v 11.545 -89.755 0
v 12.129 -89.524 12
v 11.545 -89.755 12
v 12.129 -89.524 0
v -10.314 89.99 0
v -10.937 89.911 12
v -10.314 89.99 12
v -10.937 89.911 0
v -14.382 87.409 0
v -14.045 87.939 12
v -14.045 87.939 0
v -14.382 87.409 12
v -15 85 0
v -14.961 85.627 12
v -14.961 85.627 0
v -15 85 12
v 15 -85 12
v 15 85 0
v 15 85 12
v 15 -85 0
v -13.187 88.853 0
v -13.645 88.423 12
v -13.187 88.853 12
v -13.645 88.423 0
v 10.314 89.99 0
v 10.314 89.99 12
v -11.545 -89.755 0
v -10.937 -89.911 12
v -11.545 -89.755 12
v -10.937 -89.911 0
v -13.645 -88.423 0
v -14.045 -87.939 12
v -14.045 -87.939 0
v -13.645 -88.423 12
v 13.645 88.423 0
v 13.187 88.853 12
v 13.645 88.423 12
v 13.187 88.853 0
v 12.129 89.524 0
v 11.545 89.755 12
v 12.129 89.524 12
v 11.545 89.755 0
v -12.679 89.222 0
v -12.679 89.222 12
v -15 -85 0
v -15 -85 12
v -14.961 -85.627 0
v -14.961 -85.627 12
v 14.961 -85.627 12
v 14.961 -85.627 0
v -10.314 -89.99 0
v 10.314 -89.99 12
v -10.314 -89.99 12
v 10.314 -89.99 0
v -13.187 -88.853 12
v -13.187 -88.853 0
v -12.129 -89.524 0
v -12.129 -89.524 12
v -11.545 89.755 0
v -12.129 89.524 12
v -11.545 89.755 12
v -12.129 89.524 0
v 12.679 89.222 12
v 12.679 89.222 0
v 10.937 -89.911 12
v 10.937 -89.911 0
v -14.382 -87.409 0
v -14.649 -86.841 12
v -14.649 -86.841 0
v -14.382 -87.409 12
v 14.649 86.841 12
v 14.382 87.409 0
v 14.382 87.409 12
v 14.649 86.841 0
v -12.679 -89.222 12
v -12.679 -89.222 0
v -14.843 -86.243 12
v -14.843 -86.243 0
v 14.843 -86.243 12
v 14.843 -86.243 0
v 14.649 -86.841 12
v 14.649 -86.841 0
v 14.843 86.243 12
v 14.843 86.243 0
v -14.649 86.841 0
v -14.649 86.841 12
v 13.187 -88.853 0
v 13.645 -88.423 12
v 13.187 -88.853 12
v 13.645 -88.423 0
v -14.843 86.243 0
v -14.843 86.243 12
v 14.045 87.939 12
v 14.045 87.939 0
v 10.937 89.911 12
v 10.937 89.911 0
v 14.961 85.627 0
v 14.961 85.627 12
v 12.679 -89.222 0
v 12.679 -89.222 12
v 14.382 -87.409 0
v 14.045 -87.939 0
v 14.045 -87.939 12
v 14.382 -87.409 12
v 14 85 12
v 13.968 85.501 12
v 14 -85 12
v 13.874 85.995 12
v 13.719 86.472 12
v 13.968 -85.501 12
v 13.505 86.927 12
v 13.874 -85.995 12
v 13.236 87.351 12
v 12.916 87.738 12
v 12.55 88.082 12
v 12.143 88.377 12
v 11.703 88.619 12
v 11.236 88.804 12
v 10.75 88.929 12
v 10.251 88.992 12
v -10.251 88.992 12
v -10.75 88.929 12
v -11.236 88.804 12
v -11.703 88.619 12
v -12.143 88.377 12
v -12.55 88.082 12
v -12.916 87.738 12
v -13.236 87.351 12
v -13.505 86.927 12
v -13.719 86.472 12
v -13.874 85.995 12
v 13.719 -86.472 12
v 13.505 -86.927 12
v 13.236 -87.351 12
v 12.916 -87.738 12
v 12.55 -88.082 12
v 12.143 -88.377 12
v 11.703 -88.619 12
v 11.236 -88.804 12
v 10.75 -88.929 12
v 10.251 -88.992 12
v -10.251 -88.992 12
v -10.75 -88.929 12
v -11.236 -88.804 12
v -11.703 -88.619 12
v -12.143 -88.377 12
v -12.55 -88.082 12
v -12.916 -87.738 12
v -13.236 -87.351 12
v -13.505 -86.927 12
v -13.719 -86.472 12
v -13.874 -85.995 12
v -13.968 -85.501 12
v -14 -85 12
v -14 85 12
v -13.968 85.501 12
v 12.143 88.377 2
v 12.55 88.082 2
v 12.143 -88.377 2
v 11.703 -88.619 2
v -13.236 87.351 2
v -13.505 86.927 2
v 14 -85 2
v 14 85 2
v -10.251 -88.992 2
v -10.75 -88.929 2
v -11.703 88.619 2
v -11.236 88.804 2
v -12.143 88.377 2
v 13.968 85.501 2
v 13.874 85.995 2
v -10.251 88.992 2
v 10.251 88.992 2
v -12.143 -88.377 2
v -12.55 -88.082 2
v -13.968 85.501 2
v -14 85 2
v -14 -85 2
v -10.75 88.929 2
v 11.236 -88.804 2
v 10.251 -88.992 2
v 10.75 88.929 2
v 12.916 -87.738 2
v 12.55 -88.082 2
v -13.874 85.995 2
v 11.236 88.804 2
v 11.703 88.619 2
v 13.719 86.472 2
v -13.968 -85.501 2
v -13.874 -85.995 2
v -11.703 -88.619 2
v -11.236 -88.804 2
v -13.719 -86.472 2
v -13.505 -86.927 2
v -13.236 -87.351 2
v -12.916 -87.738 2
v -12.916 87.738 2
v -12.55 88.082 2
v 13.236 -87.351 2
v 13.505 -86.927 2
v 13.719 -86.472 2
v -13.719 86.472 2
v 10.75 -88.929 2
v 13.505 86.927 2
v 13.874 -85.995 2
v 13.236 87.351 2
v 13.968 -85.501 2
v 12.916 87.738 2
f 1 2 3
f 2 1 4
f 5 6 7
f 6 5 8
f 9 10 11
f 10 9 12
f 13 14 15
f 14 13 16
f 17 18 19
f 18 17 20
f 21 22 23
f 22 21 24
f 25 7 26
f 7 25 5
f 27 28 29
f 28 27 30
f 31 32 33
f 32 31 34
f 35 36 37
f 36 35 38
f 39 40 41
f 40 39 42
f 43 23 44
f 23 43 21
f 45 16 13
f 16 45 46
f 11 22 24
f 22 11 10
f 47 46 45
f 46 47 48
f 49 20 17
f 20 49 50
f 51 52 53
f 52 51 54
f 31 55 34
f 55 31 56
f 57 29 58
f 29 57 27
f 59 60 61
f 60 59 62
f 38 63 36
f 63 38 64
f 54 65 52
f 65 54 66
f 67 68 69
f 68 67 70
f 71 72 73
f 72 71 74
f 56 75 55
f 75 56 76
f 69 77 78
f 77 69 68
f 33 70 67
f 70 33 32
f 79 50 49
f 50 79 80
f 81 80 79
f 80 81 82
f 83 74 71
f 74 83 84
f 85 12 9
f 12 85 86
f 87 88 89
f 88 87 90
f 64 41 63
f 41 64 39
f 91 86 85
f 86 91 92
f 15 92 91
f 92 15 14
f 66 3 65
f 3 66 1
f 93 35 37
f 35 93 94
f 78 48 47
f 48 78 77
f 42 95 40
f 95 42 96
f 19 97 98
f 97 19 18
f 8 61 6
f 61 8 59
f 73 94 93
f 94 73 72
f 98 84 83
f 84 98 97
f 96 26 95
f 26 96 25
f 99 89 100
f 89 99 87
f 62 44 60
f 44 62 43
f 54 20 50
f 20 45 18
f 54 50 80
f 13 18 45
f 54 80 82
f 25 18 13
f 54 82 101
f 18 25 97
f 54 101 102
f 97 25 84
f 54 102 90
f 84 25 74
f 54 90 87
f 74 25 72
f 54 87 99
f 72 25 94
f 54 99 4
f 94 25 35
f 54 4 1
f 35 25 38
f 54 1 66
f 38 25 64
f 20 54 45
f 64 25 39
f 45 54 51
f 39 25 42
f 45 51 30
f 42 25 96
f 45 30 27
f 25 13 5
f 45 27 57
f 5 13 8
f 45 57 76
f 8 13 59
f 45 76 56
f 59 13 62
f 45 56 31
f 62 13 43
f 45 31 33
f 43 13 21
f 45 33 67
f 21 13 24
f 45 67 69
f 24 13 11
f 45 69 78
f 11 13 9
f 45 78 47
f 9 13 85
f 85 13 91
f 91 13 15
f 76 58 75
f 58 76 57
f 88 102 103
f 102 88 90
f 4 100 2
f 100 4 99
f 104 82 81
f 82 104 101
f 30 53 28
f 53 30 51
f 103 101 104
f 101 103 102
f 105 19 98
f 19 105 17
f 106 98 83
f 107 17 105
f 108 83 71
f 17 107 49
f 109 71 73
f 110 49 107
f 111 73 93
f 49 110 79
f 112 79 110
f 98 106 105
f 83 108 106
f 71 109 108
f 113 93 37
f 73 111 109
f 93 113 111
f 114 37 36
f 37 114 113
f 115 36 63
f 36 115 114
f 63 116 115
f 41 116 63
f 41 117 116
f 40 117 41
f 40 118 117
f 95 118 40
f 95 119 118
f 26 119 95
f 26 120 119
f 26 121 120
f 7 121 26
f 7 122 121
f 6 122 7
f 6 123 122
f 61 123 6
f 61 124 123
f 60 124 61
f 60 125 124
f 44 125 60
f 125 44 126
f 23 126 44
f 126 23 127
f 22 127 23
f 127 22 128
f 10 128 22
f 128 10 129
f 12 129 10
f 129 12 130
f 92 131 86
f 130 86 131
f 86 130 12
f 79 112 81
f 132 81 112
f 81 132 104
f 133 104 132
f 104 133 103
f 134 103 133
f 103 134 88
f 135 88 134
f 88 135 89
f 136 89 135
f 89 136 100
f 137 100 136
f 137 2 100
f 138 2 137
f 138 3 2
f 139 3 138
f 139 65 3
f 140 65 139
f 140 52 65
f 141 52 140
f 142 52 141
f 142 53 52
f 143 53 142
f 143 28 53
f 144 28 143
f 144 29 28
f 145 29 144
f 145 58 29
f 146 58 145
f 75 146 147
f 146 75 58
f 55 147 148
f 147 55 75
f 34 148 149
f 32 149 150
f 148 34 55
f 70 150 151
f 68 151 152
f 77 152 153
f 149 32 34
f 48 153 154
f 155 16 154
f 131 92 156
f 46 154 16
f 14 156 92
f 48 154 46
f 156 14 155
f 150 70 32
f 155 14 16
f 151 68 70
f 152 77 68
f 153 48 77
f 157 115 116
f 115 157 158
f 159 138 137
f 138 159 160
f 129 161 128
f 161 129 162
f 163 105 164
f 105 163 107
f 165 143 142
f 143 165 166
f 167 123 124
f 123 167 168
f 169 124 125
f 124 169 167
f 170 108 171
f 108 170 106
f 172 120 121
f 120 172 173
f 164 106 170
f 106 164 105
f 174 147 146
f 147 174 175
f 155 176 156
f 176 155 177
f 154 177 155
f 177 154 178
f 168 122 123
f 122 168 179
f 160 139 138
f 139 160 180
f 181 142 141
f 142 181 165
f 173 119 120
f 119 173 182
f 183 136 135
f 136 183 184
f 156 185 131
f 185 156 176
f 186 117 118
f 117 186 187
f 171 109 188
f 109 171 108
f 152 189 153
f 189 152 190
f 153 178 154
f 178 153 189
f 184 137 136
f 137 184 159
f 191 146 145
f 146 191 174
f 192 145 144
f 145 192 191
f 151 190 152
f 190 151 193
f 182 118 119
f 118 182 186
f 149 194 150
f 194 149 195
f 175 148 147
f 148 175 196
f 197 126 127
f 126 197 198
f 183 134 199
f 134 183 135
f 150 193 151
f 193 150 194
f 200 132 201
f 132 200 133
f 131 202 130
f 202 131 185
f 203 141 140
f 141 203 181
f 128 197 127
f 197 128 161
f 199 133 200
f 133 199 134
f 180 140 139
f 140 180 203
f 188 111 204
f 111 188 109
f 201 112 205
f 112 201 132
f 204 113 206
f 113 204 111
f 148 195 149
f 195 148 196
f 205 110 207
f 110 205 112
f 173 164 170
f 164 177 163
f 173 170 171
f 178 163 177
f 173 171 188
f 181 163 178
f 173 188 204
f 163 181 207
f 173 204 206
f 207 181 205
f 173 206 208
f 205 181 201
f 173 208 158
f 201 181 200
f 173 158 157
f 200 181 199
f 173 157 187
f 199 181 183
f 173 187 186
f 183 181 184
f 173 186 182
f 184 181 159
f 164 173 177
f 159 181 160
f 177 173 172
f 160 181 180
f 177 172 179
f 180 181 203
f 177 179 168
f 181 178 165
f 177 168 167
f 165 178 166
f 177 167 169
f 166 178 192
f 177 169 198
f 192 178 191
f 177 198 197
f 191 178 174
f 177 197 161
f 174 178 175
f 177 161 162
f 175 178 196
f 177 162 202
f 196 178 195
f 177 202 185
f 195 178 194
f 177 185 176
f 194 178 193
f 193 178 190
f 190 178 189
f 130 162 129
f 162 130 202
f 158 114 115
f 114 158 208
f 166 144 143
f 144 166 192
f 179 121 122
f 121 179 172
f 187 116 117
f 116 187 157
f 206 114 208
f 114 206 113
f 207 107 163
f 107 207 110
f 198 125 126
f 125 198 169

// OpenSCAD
$fn = 50;


difference() {
	union() {
		hull() {
			translate(v = [-10.0000000000, 85.0000000000, 0]) {
				cylinder(h = 12, r = 5);
			}
			translate(v = [10.0000000000, 85.0000000000, 0]) {
				cylinder(h = 12, r = 5);
			}
			translate(v = [-10.0000000000, -85.0000000000, 0]) {
				cylinder(h = 12, r = 5);
			}
			translate(v = [10.0000000000, -85.0000000000, 0]) {
				cylinder(h = 12, r = 5);
			}
		}
	}
	union() {
		translate(v = [0, 0, 2]) {
			hull() {
				translate(v = [-10.0000000000, 85.0000000000, 0]) {
					cylinder(h = 10, r = 4);
				}
				translate(v = [10.0000000000, 85.0000000000, 0]) {
					cylinder(h = 10, r = 4);
				}
				translate(v = [-10.0000000000, -85.0000000000, 0]) {
					cylinder(h = 10, r = 4);
				}
				translate(v = [10.0000000000, -85.0000000000, 0]) {
					cylinder(h = 10, r = 4);
				}
			}
		}
	}
}
